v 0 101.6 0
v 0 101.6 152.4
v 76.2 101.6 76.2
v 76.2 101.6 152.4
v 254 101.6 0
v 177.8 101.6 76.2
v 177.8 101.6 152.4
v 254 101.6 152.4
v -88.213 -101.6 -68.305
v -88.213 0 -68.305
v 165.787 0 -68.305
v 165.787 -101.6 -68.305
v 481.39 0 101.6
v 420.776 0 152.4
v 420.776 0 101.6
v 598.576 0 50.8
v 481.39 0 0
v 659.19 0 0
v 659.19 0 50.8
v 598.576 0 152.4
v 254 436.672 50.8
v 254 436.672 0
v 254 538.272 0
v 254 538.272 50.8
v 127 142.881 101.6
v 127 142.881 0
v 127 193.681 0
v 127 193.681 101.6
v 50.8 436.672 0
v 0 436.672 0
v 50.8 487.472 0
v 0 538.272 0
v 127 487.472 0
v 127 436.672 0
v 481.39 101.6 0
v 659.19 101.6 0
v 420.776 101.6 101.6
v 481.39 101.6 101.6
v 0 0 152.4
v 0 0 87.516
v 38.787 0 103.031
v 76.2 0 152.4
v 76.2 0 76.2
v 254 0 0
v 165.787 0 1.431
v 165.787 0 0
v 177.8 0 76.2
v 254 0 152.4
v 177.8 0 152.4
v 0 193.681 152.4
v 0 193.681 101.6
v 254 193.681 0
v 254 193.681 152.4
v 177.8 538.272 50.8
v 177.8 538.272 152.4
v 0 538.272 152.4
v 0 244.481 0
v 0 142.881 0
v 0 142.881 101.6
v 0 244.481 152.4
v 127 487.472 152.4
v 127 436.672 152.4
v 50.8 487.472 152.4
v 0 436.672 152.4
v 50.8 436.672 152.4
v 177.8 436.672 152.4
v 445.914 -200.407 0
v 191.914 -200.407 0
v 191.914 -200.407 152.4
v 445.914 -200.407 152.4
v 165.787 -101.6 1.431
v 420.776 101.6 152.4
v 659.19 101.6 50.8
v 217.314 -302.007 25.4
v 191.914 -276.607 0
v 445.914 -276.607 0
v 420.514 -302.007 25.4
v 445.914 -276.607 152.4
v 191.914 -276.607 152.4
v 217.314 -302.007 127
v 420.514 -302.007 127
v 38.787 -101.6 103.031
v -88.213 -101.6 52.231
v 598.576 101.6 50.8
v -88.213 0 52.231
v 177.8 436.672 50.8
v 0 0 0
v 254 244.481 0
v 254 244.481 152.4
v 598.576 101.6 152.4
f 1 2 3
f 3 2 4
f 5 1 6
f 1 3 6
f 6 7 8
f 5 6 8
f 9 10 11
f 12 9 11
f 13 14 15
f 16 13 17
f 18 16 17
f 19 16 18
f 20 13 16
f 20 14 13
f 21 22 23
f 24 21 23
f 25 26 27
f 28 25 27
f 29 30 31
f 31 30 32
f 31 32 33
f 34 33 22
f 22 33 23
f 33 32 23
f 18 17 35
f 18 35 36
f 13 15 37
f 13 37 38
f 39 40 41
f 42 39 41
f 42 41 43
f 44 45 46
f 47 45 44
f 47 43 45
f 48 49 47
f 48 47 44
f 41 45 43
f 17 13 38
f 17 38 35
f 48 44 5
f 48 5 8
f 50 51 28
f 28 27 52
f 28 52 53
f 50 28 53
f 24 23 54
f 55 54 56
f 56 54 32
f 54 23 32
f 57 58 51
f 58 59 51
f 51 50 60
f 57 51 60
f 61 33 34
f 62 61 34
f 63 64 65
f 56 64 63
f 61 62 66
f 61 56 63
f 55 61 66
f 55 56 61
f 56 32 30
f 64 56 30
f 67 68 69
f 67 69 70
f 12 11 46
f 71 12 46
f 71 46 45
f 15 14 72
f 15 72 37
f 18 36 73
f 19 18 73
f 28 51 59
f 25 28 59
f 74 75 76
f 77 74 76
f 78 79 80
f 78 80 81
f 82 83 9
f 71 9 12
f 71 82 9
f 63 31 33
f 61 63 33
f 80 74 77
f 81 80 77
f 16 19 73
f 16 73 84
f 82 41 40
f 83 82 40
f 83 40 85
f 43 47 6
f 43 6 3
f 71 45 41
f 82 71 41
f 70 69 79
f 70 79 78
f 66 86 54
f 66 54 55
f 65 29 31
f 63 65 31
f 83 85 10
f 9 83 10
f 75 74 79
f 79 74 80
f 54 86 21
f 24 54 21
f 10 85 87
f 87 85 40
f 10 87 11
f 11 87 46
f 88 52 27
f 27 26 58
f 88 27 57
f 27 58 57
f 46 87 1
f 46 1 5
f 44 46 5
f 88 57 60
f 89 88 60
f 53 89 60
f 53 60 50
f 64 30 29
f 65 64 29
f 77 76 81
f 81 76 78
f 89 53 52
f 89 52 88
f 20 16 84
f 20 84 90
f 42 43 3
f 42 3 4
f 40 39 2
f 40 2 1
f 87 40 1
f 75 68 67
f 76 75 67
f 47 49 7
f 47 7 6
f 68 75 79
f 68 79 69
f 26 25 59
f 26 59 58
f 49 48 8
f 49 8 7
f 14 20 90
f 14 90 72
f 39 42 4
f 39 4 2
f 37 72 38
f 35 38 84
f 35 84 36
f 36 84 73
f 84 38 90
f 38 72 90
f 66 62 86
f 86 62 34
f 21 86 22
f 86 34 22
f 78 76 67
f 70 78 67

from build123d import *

# Parameters (mm, degrees)
F1_DEPTH  = 101.6
F3_DEPTH  = 254
F4_W      = 50.8
F4_H      = 101.6
F5_DEPTH  = 127
F7_DEPTH  = 152.4
F9_W      = 76.2
F9_H      = 101.6
F10_DEPTH = 101.6
F12_DEPTH = 101.6
F14_DEPTH = 101.6
F15_W     = 254
F15_H     = 101.6
F16_DEPTH = 152.4
F17_SIZE  = 25.4


with BuildPart() as f1:
    # F0 (on Front) → F1 (new body)
    with BuildSketch(Plane.XZ):
        Polygon((0, 152.4), (0, 0), (254, 0), (254, 152.4), (177.8, 152.4), (177.8, 76.2), (76.2, 76.2), (76.2, 152.4), align=None)
    extrude(amount=-F1_DEPTH)

    # F13 (on Front) → F14 (join)
    with BuildSketch(Plane.XZ):
        Polygon((-88.213, 52.231071), (-88.213, -68.304876), (165.787, -68.304876), (165.787, 1.431071), (38.787, 103.031071), align=None)
    extrude(amount=F14_DEPTH)


with BuildPart() as f3:
    # F2 (on Right) → F3 (new body)
    with BuildSketch(Plane.YZ):
        Polygon((142.881401, 0), (170.590496, 0), (244.481401, 0), (244.481401, 152.4), (193.681401, 152.4), (193.681401, 101.6), (142.881401, 101.6), align=None)
    extrude(amount=F3_DEPTH)

    # F4 (on face) → F5 (cut)
    with BuildSketch(Plane.YZ.offset(254)):
        with Locations((168.281401, 50.8)):
            Rectangle(F4_W, F4_H)
    extrude(amount=-F5_DEPTH, mode=Mode.SUBTRACT)


with BuildPart() as f7:
    # F6 (on Top) → F7 (new body)
    with BuildSketch(Plane.XY):
        Polygon((0, 538.272403), (0, 436.672403), (50.8, 436.672403), (50.8, 487.472403), (127, 487.472403), (127, 436.672403), (254, 436.672403), (254, 538.272403), align=None)
    extrude(amount=F7_DEPTH)

    # F9 (on face) → F10 (cut)
    with BuildSketch(Plane.XZ.offset(-436.672403)):
        with Locations((215.9, 101.6)):
            Rectangle(F9_W, F9_H)
    extrude(amount=-F10_DEPTH, mode=Mode.SUBTRACT)


with BuildPart() as f12:
    # F11 (on Front) → F12 (new body)
    with BuildSketch(Plane.XZ):
        Polygon((481.389741, 101.6), (481.389741, 0), (659.189741, 0), (659.189741, 50.8), (598.576099, 50.8), (598.576099, 152.4), (420.776099, 152.4), (420.776099, 101.6), align=None)
    extrude(amount=-F12_DEPTH)


with BuildPart() as f16:
    # F15 (on Top) → F16 (new body)
    with BuildSketch(Plane.XY):
        with Locations((318.91389, -251.207128)):
            Rectangle(F15_W, F15_H)
    extrude(amount=F16_DEPTH)

    # F17
    f17_edges = [f16.edges().sort_by_distance(p)[0] for p in [
        (191.91389, -302.007128, 76.2),
        (445.91389, -302.007128, 76.2),
        (318.91389, -302.007128, 0),
        (318.91389, -302.007128, 152.4),
    ]]
    chamfer(f17_edges, length=F17_SIZE)


solid = Compound([f1.part, f3.part, f7.part, f12.part, f16.part])
